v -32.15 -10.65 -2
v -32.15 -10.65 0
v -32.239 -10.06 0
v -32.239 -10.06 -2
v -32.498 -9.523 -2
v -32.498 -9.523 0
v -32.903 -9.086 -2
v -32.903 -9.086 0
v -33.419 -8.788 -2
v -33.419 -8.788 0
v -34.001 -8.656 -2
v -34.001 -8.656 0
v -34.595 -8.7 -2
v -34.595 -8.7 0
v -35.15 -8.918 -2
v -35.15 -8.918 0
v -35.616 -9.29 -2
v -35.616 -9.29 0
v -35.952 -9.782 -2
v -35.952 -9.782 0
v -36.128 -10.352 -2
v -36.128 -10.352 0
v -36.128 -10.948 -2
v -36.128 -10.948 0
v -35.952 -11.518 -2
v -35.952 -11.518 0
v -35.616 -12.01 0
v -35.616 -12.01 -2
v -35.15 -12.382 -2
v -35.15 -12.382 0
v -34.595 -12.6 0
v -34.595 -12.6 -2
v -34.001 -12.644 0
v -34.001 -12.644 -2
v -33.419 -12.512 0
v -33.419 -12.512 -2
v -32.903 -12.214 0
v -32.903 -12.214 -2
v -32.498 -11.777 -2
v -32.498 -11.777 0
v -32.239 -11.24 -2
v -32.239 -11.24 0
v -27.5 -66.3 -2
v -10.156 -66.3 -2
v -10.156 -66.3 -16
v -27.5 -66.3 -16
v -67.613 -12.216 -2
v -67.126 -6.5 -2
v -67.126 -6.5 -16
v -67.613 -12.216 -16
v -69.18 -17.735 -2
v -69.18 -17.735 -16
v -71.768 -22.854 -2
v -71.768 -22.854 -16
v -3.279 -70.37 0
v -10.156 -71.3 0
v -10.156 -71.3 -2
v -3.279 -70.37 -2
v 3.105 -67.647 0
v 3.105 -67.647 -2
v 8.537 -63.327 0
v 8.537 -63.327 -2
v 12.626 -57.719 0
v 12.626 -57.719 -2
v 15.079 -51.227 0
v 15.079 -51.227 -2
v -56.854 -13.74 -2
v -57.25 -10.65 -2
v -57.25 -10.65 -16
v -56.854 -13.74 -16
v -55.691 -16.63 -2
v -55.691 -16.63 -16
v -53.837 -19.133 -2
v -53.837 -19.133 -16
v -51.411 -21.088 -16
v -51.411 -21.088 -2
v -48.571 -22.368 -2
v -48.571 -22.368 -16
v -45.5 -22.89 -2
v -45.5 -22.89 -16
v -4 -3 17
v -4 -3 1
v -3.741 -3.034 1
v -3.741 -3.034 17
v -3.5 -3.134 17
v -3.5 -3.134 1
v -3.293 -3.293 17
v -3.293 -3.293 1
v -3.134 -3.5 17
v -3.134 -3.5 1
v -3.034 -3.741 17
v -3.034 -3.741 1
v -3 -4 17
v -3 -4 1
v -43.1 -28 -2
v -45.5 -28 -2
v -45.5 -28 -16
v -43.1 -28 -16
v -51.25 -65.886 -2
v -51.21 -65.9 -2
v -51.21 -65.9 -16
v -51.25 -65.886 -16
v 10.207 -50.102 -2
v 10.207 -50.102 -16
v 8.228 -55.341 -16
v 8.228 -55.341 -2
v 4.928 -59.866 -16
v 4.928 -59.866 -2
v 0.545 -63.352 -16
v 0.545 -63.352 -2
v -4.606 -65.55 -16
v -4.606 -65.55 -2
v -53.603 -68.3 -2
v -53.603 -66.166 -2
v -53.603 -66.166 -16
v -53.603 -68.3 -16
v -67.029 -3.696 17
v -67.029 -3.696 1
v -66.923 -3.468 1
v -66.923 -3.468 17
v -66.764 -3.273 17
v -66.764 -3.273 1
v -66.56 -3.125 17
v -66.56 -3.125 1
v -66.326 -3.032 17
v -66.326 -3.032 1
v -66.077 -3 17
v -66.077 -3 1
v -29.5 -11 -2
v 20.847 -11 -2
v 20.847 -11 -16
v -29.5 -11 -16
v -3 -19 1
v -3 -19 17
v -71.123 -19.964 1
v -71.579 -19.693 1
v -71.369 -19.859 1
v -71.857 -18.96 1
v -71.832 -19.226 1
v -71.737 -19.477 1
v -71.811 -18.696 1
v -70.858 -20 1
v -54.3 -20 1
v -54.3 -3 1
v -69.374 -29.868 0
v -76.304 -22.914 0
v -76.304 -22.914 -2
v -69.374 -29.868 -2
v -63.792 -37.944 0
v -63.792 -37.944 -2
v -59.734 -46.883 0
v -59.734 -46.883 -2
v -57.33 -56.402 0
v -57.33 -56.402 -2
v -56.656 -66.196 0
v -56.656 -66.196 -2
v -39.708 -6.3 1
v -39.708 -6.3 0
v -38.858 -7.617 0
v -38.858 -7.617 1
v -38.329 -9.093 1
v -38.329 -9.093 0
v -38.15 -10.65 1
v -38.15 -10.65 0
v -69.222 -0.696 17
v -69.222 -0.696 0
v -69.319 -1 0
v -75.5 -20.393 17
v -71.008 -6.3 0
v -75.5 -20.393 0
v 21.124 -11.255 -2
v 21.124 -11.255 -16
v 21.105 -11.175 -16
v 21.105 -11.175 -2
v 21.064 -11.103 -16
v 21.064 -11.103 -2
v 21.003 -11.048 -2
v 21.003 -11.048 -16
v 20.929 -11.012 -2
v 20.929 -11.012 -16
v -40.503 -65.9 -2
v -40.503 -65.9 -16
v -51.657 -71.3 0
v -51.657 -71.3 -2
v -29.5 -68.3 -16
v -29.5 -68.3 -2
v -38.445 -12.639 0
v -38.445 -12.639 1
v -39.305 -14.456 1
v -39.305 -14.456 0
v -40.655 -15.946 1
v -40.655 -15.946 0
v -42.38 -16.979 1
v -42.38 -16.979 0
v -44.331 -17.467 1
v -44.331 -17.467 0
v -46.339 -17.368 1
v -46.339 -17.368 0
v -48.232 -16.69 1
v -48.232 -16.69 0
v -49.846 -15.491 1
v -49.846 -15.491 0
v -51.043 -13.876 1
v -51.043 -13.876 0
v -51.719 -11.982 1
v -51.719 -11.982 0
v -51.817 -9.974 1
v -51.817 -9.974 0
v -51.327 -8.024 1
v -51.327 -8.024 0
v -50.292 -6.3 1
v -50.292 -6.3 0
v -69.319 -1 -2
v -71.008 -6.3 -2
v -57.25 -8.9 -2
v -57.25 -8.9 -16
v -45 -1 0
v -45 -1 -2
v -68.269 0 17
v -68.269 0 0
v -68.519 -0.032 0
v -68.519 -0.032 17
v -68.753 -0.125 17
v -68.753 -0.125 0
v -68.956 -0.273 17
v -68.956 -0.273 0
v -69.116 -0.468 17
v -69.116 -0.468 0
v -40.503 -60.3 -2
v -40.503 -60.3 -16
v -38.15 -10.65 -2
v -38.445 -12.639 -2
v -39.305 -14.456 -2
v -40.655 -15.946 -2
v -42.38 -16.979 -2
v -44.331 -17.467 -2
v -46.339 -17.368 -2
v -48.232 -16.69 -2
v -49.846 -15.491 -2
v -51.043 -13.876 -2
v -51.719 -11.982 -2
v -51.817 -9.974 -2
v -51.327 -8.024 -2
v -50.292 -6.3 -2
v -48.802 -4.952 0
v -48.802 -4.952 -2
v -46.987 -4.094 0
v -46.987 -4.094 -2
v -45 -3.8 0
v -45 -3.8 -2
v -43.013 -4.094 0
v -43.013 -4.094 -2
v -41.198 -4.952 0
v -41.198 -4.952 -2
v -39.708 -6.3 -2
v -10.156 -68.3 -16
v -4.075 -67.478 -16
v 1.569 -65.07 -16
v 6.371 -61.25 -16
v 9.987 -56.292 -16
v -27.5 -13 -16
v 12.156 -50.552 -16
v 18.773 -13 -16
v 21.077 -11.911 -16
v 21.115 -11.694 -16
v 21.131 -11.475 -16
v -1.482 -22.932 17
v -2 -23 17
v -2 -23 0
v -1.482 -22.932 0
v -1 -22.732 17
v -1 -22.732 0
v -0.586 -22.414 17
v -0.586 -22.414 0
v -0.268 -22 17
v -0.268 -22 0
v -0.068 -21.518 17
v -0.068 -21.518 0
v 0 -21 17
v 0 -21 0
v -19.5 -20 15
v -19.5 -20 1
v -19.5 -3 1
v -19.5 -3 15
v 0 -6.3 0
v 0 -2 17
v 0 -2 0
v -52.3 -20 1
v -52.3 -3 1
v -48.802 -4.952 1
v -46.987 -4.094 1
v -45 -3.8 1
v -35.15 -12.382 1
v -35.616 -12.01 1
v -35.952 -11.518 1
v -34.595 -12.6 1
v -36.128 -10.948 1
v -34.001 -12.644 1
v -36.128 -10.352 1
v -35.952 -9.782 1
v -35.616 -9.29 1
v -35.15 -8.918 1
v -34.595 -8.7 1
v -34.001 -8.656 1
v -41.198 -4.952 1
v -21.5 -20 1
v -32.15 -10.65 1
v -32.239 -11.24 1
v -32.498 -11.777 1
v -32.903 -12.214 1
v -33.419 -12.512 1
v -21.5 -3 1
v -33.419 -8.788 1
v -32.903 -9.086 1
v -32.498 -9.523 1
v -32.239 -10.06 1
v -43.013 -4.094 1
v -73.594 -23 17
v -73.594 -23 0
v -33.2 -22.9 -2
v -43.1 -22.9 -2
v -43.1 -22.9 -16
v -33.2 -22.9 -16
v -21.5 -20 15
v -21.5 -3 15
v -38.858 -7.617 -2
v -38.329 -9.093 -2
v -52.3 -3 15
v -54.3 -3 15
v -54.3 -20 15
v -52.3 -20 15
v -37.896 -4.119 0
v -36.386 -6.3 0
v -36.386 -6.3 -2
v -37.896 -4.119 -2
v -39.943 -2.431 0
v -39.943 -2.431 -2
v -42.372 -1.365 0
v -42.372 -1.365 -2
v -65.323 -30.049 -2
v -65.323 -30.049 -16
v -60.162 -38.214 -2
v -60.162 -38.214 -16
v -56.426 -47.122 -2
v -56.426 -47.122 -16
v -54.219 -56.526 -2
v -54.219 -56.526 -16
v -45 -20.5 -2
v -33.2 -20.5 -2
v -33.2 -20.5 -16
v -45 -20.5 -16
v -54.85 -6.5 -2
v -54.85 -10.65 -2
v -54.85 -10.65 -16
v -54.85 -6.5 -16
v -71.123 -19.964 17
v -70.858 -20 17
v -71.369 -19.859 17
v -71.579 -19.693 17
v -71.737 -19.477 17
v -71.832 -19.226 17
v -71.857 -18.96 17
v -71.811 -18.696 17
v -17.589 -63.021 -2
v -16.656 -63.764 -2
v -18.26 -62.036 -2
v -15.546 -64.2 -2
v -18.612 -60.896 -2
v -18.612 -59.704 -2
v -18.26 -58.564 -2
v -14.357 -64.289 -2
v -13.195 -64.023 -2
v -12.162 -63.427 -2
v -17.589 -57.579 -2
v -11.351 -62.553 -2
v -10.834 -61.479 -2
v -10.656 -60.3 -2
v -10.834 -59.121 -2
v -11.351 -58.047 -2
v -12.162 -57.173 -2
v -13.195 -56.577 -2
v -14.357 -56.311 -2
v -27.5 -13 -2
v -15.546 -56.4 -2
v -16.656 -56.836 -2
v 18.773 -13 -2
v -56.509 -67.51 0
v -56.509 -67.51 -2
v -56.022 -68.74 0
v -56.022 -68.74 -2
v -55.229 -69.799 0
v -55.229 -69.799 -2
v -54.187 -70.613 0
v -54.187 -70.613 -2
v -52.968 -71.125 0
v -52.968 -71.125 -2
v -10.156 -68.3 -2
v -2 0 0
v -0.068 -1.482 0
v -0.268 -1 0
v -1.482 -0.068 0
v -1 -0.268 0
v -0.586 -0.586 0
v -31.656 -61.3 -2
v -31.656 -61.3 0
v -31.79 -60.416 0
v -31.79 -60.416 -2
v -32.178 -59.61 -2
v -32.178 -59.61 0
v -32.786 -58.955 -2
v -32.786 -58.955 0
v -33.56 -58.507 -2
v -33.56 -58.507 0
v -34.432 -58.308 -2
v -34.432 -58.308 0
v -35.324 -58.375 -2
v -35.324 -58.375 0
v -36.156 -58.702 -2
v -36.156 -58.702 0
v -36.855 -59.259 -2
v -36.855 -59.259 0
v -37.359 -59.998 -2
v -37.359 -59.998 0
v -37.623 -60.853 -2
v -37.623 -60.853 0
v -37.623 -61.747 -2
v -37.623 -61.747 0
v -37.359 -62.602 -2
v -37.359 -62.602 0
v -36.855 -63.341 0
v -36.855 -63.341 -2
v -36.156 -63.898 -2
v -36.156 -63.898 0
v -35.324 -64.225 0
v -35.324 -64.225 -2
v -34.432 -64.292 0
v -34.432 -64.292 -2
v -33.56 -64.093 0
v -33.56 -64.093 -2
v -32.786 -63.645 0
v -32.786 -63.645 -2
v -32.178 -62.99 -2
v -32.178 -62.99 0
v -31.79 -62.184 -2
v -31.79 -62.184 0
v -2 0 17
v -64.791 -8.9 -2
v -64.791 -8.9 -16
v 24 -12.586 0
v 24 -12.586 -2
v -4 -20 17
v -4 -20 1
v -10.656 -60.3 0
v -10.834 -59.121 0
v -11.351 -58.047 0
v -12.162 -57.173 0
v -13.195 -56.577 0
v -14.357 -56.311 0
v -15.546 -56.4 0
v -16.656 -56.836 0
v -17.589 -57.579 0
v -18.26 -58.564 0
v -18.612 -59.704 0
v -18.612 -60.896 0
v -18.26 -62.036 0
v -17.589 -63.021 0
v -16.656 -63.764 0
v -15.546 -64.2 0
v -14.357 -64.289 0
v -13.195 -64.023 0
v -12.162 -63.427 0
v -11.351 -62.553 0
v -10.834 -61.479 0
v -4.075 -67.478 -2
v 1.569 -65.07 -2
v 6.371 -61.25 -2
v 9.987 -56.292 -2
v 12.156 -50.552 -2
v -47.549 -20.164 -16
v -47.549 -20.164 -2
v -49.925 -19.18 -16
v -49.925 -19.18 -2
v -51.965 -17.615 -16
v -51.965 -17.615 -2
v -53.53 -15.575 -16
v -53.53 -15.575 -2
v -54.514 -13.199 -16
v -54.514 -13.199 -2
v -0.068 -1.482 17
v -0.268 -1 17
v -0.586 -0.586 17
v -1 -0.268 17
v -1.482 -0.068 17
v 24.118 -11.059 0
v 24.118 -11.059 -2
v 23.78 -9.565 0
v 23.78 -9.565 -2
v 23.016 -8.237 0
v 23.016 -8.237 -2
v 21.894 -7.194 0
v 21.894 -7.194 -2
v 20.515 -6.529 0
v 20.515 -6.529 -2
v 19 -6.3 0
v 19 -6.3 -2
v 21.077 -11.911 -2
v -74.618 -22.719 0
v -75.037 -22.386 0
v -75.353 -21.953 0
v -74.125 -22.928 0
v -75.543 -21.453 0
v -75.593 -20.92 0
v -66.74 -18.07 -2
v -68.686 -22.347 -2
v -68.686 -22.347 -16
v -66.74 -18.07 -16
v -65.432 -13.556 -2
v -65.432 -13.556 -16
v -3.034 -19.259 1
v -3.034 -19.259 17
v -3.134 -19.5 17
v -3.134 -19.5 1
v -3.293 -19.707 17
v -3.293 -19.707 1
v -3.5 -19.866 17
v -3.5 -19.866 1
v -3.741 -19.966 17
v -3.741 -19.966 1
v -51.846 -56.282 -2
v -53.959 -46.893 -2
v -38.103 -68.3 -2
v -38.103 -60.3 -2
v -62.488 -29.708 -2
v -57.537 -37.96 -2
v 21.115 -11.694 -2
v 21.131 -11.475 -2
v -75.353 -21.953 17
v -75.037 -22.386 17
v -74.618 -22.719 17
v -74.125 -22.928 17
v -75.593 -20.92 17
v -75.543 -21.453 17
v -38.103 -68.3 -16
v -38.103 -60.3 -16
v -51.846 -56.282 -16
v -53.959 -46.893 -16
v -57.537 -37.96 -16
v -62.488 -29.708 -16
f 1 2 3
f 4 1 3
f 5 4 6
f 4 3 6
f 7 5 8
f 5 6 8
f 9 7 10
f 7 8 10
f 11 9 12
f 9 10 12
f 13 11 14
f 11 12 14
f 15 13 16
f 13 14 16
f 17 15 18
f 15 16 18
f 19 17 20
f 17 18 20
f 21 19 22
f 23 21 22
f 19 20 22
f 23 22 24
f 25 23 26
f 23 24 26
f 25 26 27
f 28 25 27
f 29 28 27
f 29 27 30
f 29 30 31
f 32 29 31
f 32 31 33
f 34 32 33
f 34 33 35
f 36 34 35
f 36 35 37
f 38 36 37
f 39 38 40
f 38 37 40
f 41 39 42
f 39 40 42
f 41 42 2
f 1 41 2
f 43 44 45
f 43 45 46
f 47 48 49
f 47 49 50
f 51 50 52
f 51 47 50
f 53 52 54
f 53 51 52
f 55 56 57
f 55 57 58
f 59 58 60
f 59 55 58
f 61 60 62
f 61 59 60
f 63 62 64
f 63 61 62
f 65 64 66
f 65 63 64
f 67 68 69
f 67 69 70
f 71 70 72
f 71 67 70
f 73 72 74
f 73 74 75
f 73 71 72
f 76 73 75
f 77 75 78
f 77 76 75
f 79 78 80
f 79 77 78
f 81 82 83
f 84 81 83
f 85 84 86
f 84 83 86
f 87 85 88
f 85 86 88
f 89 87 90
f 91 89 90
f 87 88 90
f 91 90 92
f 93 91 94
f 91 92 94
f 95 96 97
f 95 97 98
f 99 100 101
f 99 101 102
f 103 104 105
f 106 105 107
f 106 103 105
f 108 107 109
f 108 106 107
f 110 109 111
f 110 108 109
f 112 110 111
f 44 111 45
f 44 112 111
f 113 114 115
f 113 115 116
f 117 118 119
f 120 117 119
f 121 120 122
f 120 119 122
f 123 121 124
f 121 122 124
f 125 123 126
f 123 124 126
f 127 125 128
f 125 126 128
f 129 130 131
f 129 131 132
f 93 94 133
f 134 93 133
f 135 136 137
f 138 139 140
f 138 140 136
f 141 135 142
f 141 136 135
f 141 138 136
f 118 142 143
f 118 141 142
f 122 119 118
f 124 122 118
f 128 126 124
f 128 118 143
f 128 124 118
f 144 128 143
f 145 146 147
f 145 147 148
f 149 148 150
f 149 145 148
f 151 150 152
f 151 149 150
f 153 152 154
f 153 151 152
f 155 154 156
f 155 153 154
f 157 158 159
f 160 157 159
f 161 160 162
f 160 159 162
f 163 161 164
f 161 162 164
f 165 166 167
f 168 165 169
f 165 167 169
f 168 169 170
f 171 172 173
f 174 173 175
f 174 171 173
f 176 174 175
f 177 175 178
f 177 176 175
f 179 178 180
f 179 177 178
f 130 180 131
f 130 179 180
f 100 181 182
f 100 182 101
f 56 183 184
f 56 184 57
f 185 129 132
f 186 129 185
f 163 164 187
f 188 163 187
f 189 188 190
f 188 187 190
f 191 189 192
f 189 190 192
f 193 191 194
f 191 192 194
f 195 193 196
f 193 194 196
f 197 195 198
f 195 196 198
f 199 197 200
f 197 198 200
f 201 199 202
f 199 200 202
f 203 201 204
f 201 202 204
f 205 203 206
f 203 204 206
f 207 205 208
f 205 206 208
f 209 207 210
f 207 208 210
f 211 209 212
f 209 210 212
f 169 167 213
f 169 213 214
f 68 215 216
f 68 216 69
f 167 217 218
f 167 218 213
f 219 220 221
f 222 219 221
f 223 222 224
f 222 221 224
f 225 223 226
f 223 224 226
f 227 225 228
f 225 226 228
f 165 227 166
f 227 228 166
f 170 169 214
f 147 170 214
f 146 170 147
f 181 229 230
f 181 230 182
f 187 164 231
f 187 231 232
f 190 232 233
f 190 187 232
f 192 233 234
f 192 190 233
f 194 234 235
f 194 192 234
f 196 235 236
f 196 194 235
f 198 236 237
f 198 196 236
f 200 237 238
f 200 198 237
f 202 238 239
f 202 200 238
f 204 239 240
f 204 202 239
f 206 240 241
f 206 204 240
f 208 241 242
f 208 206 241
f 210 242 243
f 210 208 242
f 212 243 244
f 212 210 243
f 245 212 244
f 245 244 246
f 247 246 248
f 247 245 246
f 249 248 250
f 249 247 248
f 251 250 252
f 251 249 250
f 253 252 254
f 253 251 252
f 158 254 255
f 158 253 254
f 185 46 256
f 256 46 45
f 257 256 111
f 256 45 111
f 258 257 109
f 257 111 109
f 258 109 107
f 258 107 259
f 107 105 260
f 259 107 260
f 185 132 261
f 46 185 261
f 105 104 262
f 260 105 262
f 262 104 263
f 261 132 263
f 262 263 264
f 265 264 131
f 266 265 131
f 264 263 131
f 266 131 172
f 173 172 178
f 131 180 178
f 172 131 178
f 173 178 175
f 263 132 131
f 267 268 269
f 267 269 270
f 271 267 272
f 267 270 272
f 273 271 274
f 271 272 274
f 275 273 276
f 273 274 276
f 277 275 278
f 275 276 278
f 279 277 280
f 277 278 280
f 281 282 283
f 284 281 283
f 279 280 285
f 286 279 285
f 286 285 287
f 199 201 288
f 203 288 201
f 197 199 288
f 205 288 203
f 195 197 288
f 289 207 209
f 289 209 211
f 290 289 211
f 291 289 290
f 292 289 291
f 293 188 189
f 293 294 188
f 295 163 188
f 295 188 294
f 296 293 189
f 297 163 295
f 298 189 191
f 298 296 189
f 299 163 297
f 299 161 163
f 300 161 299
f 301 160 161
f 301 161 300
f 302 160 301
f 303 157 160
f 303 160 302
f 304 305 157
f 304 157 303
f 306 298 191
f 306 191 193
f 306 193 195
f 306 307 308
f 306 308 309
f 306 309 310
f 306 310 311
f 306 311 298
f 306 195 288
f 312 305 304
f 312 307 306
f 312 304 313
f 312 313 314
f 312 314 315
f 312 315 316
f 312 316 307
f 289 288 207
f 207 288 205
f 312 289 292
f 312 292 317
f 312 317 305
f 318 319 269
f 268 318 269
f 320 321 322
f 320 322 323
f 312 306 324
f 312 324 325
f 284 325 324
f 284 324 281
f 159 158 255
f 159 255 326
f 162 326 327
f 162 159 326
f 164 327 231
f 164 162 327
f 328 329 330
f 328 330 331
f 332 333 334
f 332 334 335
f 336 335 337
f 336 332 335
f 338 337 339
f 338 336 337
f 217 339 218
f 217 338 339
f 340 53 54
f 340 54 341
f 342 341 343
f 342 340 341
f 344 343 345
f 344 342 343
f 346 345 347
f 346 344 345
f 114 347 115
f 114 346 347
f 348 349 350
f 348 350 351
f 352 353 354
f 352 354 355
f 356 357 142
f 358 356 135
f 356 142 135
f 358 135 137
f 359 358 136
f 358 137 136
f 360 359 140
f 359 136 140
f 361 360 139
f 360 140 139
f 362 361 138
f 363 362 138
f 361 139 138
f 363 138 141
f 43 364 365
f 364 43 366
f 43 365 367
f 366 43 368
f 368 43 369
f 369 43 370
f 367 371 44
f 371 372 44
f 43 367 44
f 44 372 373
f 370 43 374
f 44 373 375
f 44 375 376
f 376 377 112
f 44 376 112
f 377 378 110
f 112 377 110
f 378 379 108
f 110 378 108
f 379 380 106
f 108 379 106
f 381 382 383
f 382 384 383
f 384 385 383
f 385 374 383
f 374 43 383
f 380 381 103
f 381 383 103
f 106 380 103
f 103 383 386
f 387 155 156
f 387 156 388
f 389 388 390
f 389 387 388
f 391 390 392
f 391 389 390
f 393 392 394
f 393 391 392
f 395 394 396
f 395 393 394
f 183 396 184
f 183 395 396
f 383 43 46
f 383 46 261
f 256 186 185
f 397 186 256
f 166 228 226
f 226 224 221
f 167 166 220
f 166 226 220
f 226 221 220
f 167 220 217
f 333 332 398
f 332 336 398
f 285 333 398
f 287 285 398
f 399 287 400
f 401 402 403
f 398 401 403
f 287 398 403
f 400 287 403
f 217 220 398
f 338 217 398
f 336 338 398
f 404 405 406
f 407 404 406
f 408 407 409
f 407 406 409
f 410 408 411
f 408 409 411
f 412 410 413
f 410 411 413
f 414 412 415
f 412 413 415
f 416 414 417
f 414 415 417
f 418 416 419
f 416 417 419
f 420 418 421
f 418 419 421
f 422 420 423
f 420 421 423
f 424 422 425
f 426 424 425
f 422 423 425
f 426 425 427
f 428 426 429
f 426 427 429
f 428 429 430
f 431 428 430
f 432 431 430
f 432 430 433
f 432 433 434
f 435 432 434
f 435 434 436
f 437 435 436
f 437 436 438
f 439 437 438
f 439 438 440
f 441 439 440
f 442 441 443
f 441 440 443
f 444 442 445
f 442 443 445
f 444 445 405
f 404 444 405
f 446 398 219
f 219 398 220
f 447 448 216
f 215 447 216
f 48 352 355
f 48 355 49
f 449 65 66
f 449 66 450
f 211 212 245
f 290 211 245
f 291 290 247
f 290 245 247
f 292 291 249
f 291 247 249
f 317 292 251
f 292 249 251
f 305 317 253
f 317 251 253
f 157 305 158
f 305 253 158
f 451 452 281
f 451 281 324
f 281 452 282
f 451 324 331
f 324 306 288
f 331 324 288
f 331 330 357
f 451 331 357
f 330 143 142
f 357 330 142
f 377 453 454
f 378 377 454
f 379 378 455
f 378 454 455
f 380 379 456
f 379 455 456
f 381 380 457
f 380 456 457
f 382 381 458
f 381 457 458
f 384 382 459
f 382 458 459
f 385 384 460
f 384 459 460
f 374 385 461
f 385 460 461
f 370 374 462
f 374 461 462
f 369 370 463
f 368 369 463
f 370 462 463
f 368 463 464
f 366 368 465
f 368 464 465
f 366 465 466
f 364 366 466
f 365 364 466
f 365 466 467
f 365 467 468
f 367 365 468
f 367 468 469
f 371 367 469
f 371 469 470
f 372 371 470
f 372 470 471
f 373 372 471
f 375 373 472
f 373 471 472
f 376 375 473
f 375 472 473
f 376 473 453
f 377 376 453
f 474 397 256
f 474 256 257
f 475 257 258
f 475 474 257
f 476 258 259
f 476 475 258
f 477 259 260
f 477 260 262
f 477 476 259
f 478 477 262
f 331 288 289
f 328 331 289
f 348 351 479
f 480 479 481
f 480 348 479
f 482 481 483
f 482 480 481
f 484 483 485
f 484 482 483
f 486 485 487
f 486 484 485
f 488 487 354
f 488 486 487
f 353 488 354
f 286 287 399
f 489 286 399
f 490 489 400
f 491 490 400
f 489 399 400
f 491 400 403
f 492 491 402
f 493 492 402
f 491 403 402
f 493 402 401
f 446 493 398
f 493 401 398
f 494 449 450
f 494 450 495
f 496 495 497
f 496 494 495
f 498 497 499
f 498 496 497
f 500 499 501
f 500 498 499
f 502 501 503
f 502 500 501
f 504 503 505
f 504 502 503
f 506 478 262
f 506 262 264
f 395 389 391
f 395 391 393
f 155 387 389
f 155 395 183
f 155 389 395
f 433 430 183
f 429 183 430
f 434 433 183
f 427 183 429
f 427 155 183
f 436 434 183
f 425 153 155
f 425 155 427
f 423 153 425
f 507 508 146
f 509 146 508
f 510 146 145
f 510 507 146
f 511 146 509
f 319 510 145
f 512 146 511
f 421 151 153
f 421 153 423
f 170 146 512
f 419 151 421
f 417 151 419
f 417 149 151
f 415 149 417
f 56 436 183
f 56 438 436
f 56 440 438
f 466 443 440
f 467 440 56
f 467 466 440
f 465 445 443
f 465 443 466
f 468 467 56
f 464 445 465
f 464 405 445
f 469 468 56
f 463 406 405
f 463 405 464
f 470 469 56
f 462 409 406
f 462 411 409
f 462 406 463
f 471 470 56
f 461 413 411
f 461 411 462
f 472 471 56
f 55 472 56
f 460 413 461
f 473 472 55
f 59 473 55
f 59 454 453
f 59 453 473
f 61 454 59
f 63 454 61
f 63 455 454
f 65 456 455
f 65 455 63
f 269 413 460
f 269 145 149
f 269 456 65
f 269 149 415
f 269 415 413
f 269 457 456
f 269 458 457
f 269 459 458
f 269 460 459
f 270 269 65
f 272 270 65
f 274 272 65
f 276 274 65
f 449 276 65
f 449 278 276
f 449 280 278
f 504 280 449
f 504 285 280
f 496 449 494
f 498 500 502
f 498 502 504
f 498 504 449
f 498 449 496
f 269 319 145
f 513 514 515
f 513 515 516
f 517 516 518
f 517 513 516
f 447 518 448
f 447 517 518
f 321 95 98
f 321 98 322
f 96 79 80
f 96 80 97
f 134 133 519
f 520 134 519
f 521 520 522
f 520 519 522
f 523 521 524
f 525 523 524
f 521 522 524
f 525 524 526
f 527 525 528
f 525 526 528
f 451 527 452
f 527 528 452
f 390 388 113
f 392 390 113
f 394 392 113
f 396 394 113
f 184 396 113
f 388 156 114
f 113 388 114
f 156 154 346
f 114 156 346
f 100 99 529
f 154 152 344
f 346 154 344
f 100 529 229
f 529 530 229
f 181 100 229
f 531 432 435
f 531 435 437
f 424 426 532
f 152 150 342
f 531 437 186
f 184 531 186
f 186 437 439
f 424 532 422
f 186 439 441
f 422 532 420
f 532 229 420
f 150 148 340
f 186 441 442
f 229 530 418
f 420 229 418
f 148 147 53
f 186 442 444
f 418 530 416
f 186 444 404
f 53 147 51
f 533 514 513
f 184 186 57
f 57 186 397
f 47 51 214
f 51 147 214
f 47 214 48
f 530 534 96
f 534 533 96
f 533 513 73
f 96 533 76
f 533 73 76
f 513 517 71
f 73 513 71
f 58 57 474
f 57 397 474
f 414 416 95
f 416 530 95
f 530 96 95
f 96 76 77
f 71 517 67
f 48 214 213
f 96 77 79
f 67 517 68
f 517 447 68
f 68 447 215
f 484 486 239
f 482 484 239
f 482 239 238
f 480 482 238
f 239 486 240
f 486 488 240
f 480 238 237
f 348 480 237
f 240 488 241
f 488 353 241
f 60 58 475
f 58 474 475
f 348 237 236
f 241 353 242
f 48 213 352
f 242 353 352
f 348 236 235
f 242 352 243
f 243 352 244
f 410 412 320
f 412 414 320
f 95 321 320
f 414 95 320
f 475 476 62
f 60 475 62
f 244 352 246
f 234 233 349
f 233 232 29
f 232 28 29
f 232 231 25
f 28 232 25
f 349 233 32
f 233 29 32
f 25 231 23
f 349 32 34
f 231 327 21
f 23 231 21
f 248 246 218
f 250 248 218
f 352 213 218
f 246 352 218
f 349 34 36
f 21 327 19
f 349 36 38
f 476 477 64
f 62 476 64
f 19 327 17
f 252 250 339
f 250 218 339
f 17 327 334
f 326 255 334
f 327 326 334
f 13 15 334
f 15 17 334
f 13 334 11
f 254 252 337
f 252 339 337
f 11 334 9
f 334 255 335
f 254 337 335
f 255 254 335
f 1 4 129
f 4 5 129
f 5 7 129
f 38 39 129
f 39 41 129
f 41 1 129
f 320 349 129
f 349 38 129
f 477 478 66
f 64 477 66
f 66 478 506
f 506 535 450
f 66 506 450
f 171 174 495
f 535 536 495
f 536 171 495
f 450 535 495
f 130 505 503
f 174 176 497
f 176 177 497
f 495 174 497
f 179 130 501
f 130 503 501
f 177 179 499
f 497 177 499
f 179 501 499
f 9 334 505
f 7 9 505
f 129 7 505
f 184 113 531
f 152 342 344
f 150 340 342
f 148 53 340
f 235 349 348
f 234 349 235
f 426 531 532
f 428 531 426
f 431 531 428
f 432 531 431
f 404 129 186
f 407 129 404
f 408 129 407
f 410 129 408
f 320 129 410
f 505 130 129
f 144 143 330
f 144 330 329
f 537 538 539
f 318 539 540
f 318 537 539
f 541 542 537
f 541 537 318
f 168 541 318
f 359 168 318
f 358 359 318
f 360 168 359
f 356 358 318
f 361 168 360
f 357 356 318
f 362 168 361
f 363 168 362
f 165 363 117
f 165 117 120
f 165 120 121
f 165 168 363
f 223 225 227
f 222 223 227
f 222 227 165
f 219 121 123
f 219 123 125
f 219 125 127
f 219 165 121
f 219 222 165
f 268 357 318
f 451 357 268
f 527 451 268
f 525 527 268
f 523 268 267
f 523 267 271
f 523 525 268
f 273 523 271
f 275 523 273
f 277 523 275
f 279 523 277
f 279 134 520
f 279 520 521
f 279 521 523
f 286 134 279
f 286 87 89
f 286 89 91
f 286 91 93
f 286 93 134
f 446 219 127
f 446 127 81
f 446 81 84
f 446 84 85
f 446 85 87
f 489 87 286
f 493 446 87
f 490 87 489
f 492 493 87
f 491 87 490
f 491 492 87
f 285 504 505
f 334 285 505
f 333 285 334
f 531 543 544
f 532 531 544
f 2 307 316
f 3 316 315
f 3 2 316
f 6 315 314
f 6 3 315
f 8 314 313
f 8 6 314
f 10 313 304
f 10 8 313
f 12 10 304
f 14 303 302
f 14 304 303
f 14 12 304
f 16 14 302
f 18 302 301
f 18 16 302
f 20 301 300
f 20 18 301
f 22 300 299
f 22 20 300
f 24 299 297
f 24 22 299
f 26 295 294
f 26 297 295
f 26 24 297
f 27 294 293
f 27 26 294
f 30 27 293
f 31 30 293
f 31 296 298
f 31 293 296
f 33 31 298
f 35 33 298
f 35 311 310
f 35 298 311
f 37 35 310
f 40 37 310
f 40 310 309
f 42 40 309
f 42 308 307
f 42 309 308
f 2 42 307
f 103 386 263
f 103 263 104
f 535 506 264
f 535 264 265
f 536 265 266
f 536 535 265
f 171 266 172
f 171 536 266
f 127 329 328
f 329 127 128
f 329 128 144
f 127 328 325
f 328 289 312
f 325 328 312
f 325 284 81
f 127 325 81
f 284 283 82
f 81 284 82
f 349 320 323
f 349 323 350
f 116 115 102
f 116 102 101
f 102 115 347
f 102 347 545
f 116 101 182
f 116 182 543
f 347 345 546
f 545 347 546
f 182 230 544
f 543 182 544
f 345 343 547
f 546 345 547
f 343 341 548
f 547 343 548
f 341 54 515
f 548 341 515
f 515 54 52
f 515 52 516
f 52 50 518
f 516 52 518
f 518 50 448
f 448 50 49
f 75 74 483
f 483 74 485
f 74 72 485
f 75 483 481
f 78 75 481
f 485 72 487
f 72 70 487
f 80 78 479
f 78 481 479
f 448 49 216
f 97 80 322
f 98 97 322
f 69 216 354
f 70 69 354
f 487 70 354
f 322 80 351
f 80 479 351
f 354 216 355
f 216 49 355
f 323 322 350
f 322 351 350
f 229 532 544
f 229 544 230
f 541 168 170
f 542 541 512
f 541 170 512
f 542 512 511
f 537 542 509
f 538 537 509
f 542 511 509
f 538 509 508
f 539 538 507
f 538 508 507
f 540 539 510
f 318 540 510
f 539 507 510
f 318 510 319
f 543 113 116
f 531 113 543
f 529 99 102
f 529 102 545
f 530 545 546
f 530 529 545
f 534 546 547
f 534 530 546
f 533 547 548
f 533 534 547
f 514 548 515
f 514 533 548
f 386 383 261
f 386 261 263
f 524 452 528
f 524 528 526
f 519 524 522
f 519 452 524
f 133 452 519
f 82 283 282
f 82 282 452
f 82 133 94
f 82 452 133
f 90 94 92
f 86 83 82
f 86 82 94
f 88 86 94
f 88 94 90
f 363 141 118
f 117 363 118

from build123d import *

# Parameters (mm, degrees)
F1_DEPTH = 17
F0_W     = 2
F0_H     = 17
F2_DEPTH = 15
F0_W_2   = 30.8
F3_DEPTH = 1
F4_R     = 3
F4_R_2   = 4
F4_R_3   = 2
F5_DEPTH = 2
F6_DEPTH = 25
F8_DEPTH = 16


with BuildPart() as f1:
    # F0 (on Top) → F1 (new body)
    with BuildSketch(Plane.XY):
        with BuildLine():
            Line((-2, 0), (-68.2691728501, 0))
            ThreePointArc((-68.2691728501, 0), (-68.8592199223, -0.1926311546), (-69.221944097, -0.6963110949))
            Line((-69.221944097, -0.6963110949), (-75.5, -20.3926221898))
            ThreePointArc((-75.5, -20.3926221898), (-75.209195197, -22.1800941445), (-73.5944575062, -23))
            Line((-73.5944575062, -23), (-2, -23))
            ThreePointArc((-2, -23), (-0.5857864376, -22.4142135624), (0, -21))
            Line((0, -21), (0, -2))
            ThreePointArc((0, -2), (-0.5857864376, -0.5857864376), (-2, 0))
        make_face()
        with BuildLine():
            ThreePointArc((-67.0294626472, -3.6963110949), (-66.6667384725, -3.1926311546), (-66.0766914003, -3))
            Line((-66.0766914003, -3), (-54.3, -3))
            Line((-54.3, -3), (-52.3, -3))
            Line((-52.3, -3), (-21.5, -3))
            Line((-21.5, -3), (-19.5, -3))
            Line((-19.5, -3), (-4, -3))
            ThreePointArc((-4, -3), (-3.2928932188, -3.2928932188), (-3, -4))
            Line((-3, -4), (-3, -19))
            ThreePointArc((-3, -19), (-3.2928932188, -19.7071067812), (-4, -20))
            Line((-4, -20), (-19.5, -20))
            Line((-19.5, -20), (-21.5, -20))
            Line((-21.5, -20), (-52.3, -20))
            Line((-52.3, -20), (-54.3, -20))
            Line((-54.3, -20), (-70.8578322998, -20))
            ThreePointArc((-70.8578322998, -20), (-71.6652011452, -19.5900470722), (-71.8106035467, -18.6963110949))
            Line((-71.8106035467, -18.6963110949), (-67.0294626472, -3.6963110949))
        make_face(mode=Mode.SUBTRACT)
    extrude(amount=F1_DEPTH)

    # F0 (on Top) → F2 (join)
    with BuildSketch(Plane.XY):
        with Locations((-53.3, -11.5)):
            Rectangle(F0_W, F0_H)
        with Locations((-20.5, -11.5)):
            Rectangle(F0_W, F0_H)
    extrude(amount=F2_DEPTH)

    # F0 (on Top) → F3 (join)
    with BuildSketch(Plane.XY):
        with BuildLine():
            Line((-54.3, -3), (-66.0766914003, -3))
            ThreePointArc((-66.0766914003, -3), (-66.6667384725, -3.1926311546), (-67.0294626472, -3.6963110949))
            Line((-67.0294626472, -3.6963110949), (-71.8106035467, -18.6963110949))
            ThreePointArc((-71.8106035467, -18.6963110949), (-71.6652011452, -19.5900470722), (-70.8578322998, -20))
            Line((-70.8578322998, -20), (-54.3, -20))
            Line((-54.3, -20), (-54.3, -3))
        make_face()
        with Locations((-36.9, -11.5)):
            Rectangle(F0_W_2, F0_H)
        with BuildLine():
            Line((-4, -3), (-19.5, -3))
            Line((-19.5, -3), (-19.5, -20))
            Line((-19.5, -20), (-4, -20))
            ThreePointArc((-4, -20), (-3.2928932188, -19.7071067812), (-3, -19))
            Line((-3, -19), (-3, -4))
            ThreePointArc((-3, -4), (-3.2928932188, -3.2928932188), (-4, -3))
        make_face()
    extrude(amount=F3_DEPTH)

    # F4 (on Top) → F5 (join)
    with BuildSketch(Plane.XY):
        with BuildLine():
            ThreePointArc((24, -12.5858614946), (23.0159698309, -8.2370738953), (19, -6.3))
            Line((19, -6.3), (-36.3860578131, -6.3))
            Line((-36.3860578131, -6.3), (-39.7084973779, -6.3))
            ThreePointArc((-39.7084973779, -6.3), (-38.5513841423, -8.3396204816), (-38.15, -10.65))
            ThreePointArc((-38.15, -10.65), (-47.3103795184, -17.0986158577), (-50.2915026221, -6.3))
            Line((-50.2915026221, -6.3), (-71.0080791799, -6.3))
            Line((-71.0080791799, -6.3), (-76.3035875518, -22.9137386762))
            ThreePointArc((-76.3035875518, -22.9137386762), (-61.5627251362, -42.3229885458), (-56.656298365, -66.1963833943))
            ThreePointArc((-56.656298365, -66.1963833943), (-55.2293521755, -69.7987081167), (-51.6573721204, -71.3))
            Line((-51.6573721204, -71.3), (-10.156298365, -71.3))
            ThreePointArc((-10.156298365, -71.3), (5.9662681641, -65.6697477172), (15.0790057851, -51.2269327109))
            Line((15.0790057851, -51.2269327109), (24, -12.5858614946))
        make_face()
        with Locations((-34.656298365, -61.3)):
            Circle(F4_R, mode=Mode.SUBTRACT)
        with Locations((-14.656298365, -60.3)):
            Circle(F4_R_2, mode=Mode.SUBTRACT)
        with Locations((-34.15, -10.65)):
            Circle(F4_R_3, mode=Mode.SUBTRACT)
        with BuildLine():
            Line((-39.7084973779, -6.3), (-36.3860578131, -6.3))
            ThreePointArc((-36.3860578131, -6.3), (-39.9430740563, -2.4311192976), (-45, -1))
            Line((-45, -1), (-69.3187427266, -1))
            Line((-69.3187427266, -1), (-71.0080791799, -6.3))
            Line((-71.0080791799, -6.3), (-50.2915026221, -6.3))
            ThreePointArc((-50.2915026221, -6.3), (-45, -3.8), (-39.7084973779, -6.3))
        make_face()
    extrude(amount=-F5_DEPTH)

    # F6 (cut): faces of the model
    f6_faces = [f1.faces().sort_by_distance(p)[0] for p in [
        (-45, -10.65, 0),
        (-34.15, -10.65, 0),
    ]]
    extrude(f6_faces, amount=-F6_DEPTH, mode=Mode.SUBTRACT)

    # F7 (on Top) → F8 (join)
    with BuildSketch(Plane.XY):
        with BuildLine():
            Line((-29.5, -68.3), (-10.156298365, -68.3))
            ThreePointArc((-10.156298365, -68.3), (4.0987242542, -63.3219232466), (12.1558955908, -50.5520795479))
            Line((12.1558955908, -50.5520795479), (21.0768898056, -11.9110083316))
            ThreePointArc((21.0768898056, -11.9110083316), (21.1260119747, -11.5846639084), (21.1241694926, -11.2546483401))
            ThreePointArc((21.1241694926, -11.2546483401), (21.0354701794, -11.0733493387), (20.8474362182, -11))
            Line((20.8474362182, -11), (-29.5, -11))
            Line((-29.5, -11), (-29.5, -68.3))
        make_face()
        with BuildLine():
            Line((-10.156298365, -66.3), (-27.5, -66.3))
            Line((-27.5, -66.3), (-27.5, -13))
            Line((-27.5, -13), (18.7728680534, -13))
            Line((18.7728680534, -13), (10.2071554612, -50.1021774392))
            ThreePointArc((10.2071554612, -50.1021774392), (2.8536949809, -61.7567069329), (-10.156298365, -66.3))
        make_face(mode=Mode.SUBTRACT)
        with BuildLine():
            Line((-53.6031346189, -68.3), (-38.1031346189, -68.3))
            Line((-38.1031346189, -68.3), (-38.1031346189, -60.3))
            Line((-38.1031346189, -60.3), (-40.5031346189, -60.3))
            Line((-40.5031346189, -60.3), (-40.5031346189, -65.9))
            Line((-40.5031346189, -65.9), (-51.2102166135, -65.9))
            Line((-51.2102166135, -65.9), (-51.2501856031, -65.886270575))
            ThreePointArc((-51.2501856031, -65.886270575), (-55.5697599064, -42.3552473048), (-68.6864102541, -22.3472173679))
            ThreePointArc((-68.6864102541, -22.3472173679), (-66.0038303781, -15.8365100283), (-64.7912408019, -8.9))
            Line((-64.7912408019, -8.9), (-57.25, -8.9))
            Line((-57.25, -8.9), (-57.25, -10.65))
            ThreePointArc((-57.25, -10.65), (-53.8370668211, -19.1334397505), (-45.5, -22.8897916649))
            ThreePointArc((-45.5, -22.8897916649), (-45.2500520996, -22.8974476503), (-45, -22.9))
            Line((-45, -22.9), (-43.1, -22.9))
            Line((-43.1, -22.9), (-33.2, -22.9))
            Line((-33.2, -22.9), (-33.2, -20.5))
            Line((-33.2, -20.5), (-45, -20.5))
            ThreePointArc((-45, -20.5), (-51.9650017947, -17.6150017947), (-54.85, -10.65))
            Line((-54.85, -10.65), (-54.85, -6.5))
            Line((-54.85, -6.5), (-67.1262612777, -6.5))
            ThreePointArc((-67.1262612777, -6.5), (-68.2643194585, -15.0127044985), (-71.7676746543, -22.8541212502))
            ThreePointArc((-71.7676746543, -22.8541212502), (-58.1079401486, -42.5901979394), (-53.6031346189, -66.1657742205))
            Line((-53.6031346189, -66.1657742205), (-53.6031346189, -68.3))
        make_face()
        with BuildLine():
            Line((-43.1, -28), (-43.1, -22.9))
            Line((-43.1, -22.9), (-45, -22.9))
            ThreePointArc((-45, -22.9), (-45.2500520996, -22.8974476503), (-45.5, -22.8897916649))
            Line((-45.5, -22.8897916649), (-45.5, -28))
            Line((-45.5, -28), (-43.1, -28))
        make_face()
    extrude(amount=-F8_DEPTH)


solid = f1.part
